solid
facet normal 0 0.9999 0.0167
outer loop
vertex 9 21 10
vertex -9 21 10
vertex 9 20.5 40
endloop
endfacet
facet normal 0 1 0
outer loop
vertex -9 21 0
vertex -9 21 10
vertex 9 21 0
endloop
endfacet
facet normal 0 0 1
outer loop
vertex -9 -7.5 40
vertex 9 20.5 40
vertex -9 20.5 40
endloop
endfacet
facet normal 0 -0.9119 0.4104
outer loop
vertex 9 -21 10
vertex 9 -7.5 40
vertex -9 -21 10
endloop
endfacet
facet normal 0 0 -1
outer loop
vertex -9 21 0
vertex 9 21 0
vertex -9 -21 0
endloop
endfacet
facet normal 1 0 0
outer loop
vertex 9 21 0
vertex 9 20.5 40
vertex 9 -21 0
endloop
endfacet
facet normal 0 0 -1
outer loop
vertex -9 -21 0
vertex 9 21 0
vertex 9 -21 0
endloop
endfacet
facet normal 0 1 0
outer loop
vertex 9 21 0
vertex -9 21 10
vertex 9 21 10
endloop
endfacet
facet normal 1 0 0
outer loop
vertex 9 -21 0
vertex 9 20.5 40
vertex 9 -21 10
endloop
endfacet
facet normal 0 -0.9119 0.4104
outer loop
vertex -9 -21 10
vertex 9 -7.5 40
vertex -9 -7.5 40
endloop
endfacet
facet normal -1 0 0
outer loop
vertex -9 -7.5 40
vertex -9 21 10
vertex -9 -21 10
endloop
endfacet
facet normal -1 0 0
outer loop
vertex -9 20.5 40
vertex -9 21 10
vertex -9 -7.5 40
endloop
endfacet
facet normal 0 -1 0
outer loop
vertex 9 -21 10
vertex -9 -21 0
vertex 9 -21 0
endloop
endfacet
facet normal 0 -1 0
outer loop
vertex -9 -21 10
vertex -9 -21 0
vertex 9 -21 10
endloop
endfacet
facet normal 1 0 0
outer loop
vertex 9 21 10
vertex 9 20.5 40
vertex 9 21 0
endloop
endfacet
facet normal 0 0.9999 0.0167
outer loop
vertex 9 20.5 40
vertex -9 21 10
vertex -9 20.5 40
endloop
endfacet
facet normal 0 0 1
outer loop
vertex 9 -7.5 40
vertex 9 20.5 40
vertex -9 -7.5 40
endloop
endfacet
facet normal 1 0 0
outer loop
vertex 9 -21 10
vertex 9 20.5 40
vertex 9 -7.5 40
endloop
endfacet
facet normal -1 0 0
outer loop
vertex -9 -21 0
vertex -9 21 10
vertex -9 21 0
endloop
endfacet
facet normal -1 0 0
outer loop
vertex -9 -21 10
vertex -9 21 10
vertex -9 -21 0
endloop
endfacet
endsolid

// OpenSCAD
l = 40;
b = 16;
w = 40;
t = 1.0;
o = 0.65;

	hull()
	{
		translate( [ 0, 0, 5 ] )
		cube( [ b+t*2, w+t*2, 10 ], center = true );
		translate( [ 0, w*o/4, l-5 ] )
		cube( [ b+t*2, w*o+t*2, 10 ], center = true );
	}
 
